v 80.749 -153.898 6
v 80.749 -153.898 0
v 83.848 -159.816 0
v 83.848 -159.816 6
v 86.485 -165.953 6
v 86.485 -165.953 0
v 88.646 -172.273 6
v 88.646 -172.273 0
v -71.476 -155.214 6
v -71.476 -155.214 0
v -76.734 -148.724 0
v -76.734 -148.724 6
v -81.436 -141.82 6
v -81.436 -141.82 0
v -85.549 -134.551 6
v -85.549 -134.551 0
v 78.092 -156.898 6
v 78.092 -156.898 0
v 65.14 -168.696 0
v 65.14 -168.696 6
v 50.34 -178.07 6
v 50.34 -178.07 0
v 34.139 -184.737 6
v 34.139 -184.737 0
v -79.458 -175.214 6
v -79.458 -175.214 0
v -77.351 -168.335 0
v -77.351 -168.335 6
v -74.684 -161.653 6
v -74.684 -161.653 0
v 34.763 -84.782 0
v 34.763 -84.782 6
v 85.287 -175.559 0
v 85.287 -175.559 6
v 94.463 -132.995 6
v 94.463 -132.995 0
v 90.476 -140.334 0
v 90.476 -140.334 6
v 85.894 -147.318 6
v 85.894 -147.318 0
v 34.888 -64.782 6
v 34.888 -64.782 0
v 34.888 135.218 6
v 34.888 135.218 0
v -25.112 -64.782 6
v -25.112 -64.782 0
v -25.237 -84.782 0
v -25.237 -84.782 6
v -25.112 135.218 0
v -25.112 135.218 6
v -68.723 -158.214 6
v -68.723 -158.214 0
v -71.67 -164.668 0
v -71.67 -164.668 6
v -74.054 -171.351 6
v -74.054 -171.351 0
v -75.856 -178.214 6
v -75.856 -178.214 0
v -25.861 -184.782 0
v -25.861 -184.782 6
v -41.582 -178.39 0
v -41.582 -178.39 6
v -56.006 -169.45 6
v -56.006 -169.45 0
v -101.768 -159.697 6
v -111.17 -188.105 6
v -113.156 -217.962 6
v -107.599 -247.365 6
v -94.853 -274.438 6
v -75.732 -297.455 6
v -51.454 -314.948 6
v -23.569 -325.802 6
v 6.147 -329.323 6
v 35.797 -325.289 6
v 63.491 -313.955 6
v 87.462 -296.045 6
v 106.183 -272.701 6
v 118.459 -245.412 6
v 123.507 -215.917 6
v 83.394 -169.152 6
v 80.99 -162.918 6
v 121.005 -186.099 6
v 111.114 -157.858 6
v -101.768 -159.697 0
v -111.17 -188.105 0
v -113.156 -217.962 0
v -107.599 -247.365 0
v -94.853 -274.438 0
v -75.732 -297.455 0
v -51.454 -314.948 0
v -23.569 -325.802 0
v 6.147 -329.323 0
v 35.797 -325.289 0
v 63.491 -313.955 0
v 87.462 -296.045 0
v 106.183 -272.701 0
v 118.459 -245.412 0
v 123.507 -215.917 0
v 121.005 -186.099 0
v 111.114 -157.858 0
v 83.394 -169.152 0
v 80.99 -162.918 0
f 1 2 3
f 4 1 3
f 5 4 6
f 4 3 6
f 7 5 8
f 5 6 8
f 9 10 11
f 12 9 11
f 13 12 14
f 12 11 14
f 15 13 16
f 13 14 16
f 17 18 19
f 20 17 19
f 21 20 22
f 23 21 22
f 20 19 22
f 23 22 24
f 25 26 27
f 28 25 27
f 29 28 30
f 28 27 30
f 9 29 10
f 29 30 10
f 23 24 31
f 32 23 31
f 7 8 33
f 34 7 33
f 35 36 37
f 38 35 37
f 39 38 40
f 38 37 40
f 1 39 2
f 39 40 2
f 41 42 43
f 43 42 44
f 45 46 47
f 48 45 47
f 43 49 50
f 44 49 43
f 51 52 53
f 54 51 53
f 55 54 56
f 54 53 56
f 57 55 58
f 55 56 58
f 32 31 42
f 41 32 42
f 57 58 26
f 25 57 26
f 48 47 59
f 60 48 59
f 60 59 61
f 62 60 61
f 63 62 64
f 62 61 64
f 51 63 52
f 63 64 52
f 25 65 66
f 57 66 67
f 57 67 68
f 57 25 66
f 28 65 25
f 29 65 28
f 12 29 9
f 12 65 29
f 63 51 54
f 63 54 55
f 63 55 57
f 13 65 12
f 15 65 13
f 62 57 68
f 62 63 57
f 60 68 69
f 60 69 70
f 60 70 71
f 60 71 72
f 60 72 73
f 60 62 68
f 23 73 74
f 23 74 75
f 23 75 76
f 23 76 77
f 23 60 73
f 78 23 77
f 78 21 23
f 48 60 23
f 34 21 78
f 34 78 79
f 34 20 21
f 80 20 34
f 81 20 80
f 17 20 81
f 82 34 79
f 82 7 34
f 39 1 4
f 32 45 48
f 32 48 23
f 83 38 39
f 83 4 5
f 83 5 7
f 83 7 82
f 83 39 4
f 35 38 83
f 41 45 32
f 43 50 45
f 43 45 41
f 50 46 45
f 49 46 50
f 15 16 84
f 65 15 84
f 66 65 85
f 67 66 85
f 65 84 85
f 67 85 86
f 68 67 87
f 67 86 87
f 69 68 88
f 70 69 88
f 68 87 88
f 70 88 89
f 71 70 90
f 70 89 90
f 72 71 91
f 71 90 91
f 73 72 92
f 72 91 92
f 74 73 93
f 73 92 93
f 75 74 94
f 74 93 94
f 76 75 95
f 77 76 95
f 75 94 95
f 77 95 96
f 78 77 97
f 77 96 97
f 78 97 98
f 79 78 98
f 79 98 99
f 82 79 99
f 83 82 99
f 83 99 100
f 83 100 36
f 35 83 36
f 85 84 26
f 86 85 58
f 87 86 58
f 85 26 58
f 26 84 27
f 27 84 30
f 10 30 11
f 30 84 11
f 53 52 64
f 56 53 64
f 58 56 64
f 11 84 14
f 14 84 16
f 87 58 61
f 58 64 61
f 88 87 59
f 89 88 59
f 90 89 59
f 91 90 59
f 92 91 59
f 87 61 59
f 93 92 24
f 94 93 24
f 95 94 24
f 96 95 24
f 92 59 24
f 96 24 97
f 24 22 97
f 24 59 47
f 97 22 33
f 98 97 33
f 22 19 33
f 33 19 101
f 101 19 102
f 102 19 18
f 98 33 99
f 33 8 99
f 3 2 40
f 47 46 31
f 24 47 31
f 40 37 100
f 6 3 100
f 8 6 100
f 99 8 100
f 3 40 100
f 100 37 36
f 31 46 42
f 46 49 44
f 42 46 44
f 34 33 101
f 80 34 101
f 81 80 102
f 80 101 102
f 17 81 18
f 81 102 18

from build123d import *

# Parameters (mm, degrees)
F0_W     = 60
F0_H     = 200
F1_DEPTH = 6


# Not quite as in the source:
# - the program builds the solid bodies; features that only make, move or delete a surface that nothing else refers to are left out


with BuildPart() as f1:
    # F0 (on Top) → F1 (new body)
    with BuildSketch(Plane.XY):
        with Locations((4.8876879096, 35.2179194741)):
            Rectangle(F0_W, F0_H)
        with BuildLine():
            ThreePointArc((-79.4584430704, -175.2136584167), (-76.086405566, -164.9666401832), (-71.4764851469, -155.2136584167))
            ThreePointArc((-71.4764851469, -155.2136584167), (-79.1565485083, -145.3205641479), (-85.5490516624, -134.5505784994))
            ThreePointArc((-85.5490516624, -134.5505784994), (6.1468085688, -329.3233337338), (94.4628409087, -132.9949471034))
            ThreePointArc((94.4628409087, -132.9949471034), (88.2574232589, -143.8738017875), (80.7494829473, -153.8981481364))
            ThreePointArc((80.7494829473, -153.8981481364), (85.2254366965, -162.8589485125), (88.6456429035, -172.2734211397))
            ThreePointArc((88.6456429035, -172.2734211397), (75.2367314586, -249.2062042963), (5.6459887203, -284.6403764396))
            ThreePointArc((5.6459887203, -284.6403764396), (-63.9155377146, -250.9329661403), (-79.4584430704, -175.2136584167))
        make_face()
        with BuildLine():
            ThreePointArc((4.8876879096, -189.3289751767), (-10.6634233248, -188.2490297182), (-25.8614792361, -184.7816907769))
            ThreePointArc((-25.8614792361, -184.7816907769), (-48.9823809676, -174.2243385437), (-68.7229965841, -158.2136584167))
            ThreePointArc((-68.7229965841, -158.2136584167), (-72.9335538665, -167.9839691049), (-75.8560904631, -178.2136584167))
            ThreePointArc((-75.8560904631, -178.2136584167), (-59.2361153237, -247.9542245013), (5.5975931326, -278.5574984969))
            Line((5.5975931326, -278.5574984969), (4.8876879096, -189.3289751767))
        make_face()
        with BuildLine():
            ThreePointArc((78.0917461365, -156.8981481364), (57.9442467877, -173.7054474984), (34.1385207639, -184.7369682609))
            ThreePointArc((34.1385207639, -184.7369682609), (19.6828166371, -188.1140297879), (4.8876879096, -189.3289751767))
            Line((4.8876879096, -189.3289751767), (5.5975931326, -278.5574984969))
            ThreePointArc((5.5975931326, -278.5574984969), (70.4913174106, -246.4384867175), (85.2871903638, -175.5589515052))
            ThreePointArc((85.2871903638, -175.5589515052), (82.255170922, -166.010419768), (78.0917461365, -156.8981481364))
        make_face()
        with BuildLine():
            ThreePointArc((5.5975931326, -278.5574984969), (-59.2361153237, -247.9542245013), (-75.8560904631, -178.2136584167))
            Line((-75.8560904631, -178.2136584167), (-79.4584430704, -175.2136584167))
            ThreePointArc((-79.4584430704, -175.2136584167), (-63.9155377146, -250.9329661403), (5.6459887203, -284.6403764396))
            Line((5.6459887203, -284.6403764396), (5.5975931326, -278.5574984969))
        make_face()
        with BuildLine():
            ThreePointArc((85.2871903638, -175.5589515052), (70.4913174106, -246.4384867175), (5.5975931326, -278.5574984969))
            Line((5.5975931326, -278.5574984969), (5.6459887203, -284.6403764396))
            ThreePointArc((5.6459887203, -284.6403764396), (75.2367314586, -249.2062042963), (88.6456429035, -172.2734211397))
            Line((88.6456429035, -172.2734211397), (85.2871903638, -175.5589515052))
        make_face()
        with BuildLine():
            Line((34.7627821954, -84.7816907769), (-25.2371712536, -84.7816907769))
            Line((-25.2371712536, -84.7816907769), (-25.8614792361, -184.7816907769))
            ThreePointArc((-25.8614792361, -184.7816907769), (-10.6634233248, -188.2490297182), (4.8876879096, -189.3289751767))
            ThreePointArc((4.8876879096, -189.3289751767), (19.6828166371, -188.1140297879), (34.1385207639, -184.7369682609))
            Line((34.1385207639, -184.7369682609), (34.7627821954, -84.7816907769))
        make_face()
        Polygon((34.8876879096, -64.7820805259), (-25.1123120904, -64.7820805259), (-25.2371712536, -84.7816907769), (34.7627821954, -84.7816907769), align=None)
    extrude(amount=F1_DEPTH)


solid = f1.part
